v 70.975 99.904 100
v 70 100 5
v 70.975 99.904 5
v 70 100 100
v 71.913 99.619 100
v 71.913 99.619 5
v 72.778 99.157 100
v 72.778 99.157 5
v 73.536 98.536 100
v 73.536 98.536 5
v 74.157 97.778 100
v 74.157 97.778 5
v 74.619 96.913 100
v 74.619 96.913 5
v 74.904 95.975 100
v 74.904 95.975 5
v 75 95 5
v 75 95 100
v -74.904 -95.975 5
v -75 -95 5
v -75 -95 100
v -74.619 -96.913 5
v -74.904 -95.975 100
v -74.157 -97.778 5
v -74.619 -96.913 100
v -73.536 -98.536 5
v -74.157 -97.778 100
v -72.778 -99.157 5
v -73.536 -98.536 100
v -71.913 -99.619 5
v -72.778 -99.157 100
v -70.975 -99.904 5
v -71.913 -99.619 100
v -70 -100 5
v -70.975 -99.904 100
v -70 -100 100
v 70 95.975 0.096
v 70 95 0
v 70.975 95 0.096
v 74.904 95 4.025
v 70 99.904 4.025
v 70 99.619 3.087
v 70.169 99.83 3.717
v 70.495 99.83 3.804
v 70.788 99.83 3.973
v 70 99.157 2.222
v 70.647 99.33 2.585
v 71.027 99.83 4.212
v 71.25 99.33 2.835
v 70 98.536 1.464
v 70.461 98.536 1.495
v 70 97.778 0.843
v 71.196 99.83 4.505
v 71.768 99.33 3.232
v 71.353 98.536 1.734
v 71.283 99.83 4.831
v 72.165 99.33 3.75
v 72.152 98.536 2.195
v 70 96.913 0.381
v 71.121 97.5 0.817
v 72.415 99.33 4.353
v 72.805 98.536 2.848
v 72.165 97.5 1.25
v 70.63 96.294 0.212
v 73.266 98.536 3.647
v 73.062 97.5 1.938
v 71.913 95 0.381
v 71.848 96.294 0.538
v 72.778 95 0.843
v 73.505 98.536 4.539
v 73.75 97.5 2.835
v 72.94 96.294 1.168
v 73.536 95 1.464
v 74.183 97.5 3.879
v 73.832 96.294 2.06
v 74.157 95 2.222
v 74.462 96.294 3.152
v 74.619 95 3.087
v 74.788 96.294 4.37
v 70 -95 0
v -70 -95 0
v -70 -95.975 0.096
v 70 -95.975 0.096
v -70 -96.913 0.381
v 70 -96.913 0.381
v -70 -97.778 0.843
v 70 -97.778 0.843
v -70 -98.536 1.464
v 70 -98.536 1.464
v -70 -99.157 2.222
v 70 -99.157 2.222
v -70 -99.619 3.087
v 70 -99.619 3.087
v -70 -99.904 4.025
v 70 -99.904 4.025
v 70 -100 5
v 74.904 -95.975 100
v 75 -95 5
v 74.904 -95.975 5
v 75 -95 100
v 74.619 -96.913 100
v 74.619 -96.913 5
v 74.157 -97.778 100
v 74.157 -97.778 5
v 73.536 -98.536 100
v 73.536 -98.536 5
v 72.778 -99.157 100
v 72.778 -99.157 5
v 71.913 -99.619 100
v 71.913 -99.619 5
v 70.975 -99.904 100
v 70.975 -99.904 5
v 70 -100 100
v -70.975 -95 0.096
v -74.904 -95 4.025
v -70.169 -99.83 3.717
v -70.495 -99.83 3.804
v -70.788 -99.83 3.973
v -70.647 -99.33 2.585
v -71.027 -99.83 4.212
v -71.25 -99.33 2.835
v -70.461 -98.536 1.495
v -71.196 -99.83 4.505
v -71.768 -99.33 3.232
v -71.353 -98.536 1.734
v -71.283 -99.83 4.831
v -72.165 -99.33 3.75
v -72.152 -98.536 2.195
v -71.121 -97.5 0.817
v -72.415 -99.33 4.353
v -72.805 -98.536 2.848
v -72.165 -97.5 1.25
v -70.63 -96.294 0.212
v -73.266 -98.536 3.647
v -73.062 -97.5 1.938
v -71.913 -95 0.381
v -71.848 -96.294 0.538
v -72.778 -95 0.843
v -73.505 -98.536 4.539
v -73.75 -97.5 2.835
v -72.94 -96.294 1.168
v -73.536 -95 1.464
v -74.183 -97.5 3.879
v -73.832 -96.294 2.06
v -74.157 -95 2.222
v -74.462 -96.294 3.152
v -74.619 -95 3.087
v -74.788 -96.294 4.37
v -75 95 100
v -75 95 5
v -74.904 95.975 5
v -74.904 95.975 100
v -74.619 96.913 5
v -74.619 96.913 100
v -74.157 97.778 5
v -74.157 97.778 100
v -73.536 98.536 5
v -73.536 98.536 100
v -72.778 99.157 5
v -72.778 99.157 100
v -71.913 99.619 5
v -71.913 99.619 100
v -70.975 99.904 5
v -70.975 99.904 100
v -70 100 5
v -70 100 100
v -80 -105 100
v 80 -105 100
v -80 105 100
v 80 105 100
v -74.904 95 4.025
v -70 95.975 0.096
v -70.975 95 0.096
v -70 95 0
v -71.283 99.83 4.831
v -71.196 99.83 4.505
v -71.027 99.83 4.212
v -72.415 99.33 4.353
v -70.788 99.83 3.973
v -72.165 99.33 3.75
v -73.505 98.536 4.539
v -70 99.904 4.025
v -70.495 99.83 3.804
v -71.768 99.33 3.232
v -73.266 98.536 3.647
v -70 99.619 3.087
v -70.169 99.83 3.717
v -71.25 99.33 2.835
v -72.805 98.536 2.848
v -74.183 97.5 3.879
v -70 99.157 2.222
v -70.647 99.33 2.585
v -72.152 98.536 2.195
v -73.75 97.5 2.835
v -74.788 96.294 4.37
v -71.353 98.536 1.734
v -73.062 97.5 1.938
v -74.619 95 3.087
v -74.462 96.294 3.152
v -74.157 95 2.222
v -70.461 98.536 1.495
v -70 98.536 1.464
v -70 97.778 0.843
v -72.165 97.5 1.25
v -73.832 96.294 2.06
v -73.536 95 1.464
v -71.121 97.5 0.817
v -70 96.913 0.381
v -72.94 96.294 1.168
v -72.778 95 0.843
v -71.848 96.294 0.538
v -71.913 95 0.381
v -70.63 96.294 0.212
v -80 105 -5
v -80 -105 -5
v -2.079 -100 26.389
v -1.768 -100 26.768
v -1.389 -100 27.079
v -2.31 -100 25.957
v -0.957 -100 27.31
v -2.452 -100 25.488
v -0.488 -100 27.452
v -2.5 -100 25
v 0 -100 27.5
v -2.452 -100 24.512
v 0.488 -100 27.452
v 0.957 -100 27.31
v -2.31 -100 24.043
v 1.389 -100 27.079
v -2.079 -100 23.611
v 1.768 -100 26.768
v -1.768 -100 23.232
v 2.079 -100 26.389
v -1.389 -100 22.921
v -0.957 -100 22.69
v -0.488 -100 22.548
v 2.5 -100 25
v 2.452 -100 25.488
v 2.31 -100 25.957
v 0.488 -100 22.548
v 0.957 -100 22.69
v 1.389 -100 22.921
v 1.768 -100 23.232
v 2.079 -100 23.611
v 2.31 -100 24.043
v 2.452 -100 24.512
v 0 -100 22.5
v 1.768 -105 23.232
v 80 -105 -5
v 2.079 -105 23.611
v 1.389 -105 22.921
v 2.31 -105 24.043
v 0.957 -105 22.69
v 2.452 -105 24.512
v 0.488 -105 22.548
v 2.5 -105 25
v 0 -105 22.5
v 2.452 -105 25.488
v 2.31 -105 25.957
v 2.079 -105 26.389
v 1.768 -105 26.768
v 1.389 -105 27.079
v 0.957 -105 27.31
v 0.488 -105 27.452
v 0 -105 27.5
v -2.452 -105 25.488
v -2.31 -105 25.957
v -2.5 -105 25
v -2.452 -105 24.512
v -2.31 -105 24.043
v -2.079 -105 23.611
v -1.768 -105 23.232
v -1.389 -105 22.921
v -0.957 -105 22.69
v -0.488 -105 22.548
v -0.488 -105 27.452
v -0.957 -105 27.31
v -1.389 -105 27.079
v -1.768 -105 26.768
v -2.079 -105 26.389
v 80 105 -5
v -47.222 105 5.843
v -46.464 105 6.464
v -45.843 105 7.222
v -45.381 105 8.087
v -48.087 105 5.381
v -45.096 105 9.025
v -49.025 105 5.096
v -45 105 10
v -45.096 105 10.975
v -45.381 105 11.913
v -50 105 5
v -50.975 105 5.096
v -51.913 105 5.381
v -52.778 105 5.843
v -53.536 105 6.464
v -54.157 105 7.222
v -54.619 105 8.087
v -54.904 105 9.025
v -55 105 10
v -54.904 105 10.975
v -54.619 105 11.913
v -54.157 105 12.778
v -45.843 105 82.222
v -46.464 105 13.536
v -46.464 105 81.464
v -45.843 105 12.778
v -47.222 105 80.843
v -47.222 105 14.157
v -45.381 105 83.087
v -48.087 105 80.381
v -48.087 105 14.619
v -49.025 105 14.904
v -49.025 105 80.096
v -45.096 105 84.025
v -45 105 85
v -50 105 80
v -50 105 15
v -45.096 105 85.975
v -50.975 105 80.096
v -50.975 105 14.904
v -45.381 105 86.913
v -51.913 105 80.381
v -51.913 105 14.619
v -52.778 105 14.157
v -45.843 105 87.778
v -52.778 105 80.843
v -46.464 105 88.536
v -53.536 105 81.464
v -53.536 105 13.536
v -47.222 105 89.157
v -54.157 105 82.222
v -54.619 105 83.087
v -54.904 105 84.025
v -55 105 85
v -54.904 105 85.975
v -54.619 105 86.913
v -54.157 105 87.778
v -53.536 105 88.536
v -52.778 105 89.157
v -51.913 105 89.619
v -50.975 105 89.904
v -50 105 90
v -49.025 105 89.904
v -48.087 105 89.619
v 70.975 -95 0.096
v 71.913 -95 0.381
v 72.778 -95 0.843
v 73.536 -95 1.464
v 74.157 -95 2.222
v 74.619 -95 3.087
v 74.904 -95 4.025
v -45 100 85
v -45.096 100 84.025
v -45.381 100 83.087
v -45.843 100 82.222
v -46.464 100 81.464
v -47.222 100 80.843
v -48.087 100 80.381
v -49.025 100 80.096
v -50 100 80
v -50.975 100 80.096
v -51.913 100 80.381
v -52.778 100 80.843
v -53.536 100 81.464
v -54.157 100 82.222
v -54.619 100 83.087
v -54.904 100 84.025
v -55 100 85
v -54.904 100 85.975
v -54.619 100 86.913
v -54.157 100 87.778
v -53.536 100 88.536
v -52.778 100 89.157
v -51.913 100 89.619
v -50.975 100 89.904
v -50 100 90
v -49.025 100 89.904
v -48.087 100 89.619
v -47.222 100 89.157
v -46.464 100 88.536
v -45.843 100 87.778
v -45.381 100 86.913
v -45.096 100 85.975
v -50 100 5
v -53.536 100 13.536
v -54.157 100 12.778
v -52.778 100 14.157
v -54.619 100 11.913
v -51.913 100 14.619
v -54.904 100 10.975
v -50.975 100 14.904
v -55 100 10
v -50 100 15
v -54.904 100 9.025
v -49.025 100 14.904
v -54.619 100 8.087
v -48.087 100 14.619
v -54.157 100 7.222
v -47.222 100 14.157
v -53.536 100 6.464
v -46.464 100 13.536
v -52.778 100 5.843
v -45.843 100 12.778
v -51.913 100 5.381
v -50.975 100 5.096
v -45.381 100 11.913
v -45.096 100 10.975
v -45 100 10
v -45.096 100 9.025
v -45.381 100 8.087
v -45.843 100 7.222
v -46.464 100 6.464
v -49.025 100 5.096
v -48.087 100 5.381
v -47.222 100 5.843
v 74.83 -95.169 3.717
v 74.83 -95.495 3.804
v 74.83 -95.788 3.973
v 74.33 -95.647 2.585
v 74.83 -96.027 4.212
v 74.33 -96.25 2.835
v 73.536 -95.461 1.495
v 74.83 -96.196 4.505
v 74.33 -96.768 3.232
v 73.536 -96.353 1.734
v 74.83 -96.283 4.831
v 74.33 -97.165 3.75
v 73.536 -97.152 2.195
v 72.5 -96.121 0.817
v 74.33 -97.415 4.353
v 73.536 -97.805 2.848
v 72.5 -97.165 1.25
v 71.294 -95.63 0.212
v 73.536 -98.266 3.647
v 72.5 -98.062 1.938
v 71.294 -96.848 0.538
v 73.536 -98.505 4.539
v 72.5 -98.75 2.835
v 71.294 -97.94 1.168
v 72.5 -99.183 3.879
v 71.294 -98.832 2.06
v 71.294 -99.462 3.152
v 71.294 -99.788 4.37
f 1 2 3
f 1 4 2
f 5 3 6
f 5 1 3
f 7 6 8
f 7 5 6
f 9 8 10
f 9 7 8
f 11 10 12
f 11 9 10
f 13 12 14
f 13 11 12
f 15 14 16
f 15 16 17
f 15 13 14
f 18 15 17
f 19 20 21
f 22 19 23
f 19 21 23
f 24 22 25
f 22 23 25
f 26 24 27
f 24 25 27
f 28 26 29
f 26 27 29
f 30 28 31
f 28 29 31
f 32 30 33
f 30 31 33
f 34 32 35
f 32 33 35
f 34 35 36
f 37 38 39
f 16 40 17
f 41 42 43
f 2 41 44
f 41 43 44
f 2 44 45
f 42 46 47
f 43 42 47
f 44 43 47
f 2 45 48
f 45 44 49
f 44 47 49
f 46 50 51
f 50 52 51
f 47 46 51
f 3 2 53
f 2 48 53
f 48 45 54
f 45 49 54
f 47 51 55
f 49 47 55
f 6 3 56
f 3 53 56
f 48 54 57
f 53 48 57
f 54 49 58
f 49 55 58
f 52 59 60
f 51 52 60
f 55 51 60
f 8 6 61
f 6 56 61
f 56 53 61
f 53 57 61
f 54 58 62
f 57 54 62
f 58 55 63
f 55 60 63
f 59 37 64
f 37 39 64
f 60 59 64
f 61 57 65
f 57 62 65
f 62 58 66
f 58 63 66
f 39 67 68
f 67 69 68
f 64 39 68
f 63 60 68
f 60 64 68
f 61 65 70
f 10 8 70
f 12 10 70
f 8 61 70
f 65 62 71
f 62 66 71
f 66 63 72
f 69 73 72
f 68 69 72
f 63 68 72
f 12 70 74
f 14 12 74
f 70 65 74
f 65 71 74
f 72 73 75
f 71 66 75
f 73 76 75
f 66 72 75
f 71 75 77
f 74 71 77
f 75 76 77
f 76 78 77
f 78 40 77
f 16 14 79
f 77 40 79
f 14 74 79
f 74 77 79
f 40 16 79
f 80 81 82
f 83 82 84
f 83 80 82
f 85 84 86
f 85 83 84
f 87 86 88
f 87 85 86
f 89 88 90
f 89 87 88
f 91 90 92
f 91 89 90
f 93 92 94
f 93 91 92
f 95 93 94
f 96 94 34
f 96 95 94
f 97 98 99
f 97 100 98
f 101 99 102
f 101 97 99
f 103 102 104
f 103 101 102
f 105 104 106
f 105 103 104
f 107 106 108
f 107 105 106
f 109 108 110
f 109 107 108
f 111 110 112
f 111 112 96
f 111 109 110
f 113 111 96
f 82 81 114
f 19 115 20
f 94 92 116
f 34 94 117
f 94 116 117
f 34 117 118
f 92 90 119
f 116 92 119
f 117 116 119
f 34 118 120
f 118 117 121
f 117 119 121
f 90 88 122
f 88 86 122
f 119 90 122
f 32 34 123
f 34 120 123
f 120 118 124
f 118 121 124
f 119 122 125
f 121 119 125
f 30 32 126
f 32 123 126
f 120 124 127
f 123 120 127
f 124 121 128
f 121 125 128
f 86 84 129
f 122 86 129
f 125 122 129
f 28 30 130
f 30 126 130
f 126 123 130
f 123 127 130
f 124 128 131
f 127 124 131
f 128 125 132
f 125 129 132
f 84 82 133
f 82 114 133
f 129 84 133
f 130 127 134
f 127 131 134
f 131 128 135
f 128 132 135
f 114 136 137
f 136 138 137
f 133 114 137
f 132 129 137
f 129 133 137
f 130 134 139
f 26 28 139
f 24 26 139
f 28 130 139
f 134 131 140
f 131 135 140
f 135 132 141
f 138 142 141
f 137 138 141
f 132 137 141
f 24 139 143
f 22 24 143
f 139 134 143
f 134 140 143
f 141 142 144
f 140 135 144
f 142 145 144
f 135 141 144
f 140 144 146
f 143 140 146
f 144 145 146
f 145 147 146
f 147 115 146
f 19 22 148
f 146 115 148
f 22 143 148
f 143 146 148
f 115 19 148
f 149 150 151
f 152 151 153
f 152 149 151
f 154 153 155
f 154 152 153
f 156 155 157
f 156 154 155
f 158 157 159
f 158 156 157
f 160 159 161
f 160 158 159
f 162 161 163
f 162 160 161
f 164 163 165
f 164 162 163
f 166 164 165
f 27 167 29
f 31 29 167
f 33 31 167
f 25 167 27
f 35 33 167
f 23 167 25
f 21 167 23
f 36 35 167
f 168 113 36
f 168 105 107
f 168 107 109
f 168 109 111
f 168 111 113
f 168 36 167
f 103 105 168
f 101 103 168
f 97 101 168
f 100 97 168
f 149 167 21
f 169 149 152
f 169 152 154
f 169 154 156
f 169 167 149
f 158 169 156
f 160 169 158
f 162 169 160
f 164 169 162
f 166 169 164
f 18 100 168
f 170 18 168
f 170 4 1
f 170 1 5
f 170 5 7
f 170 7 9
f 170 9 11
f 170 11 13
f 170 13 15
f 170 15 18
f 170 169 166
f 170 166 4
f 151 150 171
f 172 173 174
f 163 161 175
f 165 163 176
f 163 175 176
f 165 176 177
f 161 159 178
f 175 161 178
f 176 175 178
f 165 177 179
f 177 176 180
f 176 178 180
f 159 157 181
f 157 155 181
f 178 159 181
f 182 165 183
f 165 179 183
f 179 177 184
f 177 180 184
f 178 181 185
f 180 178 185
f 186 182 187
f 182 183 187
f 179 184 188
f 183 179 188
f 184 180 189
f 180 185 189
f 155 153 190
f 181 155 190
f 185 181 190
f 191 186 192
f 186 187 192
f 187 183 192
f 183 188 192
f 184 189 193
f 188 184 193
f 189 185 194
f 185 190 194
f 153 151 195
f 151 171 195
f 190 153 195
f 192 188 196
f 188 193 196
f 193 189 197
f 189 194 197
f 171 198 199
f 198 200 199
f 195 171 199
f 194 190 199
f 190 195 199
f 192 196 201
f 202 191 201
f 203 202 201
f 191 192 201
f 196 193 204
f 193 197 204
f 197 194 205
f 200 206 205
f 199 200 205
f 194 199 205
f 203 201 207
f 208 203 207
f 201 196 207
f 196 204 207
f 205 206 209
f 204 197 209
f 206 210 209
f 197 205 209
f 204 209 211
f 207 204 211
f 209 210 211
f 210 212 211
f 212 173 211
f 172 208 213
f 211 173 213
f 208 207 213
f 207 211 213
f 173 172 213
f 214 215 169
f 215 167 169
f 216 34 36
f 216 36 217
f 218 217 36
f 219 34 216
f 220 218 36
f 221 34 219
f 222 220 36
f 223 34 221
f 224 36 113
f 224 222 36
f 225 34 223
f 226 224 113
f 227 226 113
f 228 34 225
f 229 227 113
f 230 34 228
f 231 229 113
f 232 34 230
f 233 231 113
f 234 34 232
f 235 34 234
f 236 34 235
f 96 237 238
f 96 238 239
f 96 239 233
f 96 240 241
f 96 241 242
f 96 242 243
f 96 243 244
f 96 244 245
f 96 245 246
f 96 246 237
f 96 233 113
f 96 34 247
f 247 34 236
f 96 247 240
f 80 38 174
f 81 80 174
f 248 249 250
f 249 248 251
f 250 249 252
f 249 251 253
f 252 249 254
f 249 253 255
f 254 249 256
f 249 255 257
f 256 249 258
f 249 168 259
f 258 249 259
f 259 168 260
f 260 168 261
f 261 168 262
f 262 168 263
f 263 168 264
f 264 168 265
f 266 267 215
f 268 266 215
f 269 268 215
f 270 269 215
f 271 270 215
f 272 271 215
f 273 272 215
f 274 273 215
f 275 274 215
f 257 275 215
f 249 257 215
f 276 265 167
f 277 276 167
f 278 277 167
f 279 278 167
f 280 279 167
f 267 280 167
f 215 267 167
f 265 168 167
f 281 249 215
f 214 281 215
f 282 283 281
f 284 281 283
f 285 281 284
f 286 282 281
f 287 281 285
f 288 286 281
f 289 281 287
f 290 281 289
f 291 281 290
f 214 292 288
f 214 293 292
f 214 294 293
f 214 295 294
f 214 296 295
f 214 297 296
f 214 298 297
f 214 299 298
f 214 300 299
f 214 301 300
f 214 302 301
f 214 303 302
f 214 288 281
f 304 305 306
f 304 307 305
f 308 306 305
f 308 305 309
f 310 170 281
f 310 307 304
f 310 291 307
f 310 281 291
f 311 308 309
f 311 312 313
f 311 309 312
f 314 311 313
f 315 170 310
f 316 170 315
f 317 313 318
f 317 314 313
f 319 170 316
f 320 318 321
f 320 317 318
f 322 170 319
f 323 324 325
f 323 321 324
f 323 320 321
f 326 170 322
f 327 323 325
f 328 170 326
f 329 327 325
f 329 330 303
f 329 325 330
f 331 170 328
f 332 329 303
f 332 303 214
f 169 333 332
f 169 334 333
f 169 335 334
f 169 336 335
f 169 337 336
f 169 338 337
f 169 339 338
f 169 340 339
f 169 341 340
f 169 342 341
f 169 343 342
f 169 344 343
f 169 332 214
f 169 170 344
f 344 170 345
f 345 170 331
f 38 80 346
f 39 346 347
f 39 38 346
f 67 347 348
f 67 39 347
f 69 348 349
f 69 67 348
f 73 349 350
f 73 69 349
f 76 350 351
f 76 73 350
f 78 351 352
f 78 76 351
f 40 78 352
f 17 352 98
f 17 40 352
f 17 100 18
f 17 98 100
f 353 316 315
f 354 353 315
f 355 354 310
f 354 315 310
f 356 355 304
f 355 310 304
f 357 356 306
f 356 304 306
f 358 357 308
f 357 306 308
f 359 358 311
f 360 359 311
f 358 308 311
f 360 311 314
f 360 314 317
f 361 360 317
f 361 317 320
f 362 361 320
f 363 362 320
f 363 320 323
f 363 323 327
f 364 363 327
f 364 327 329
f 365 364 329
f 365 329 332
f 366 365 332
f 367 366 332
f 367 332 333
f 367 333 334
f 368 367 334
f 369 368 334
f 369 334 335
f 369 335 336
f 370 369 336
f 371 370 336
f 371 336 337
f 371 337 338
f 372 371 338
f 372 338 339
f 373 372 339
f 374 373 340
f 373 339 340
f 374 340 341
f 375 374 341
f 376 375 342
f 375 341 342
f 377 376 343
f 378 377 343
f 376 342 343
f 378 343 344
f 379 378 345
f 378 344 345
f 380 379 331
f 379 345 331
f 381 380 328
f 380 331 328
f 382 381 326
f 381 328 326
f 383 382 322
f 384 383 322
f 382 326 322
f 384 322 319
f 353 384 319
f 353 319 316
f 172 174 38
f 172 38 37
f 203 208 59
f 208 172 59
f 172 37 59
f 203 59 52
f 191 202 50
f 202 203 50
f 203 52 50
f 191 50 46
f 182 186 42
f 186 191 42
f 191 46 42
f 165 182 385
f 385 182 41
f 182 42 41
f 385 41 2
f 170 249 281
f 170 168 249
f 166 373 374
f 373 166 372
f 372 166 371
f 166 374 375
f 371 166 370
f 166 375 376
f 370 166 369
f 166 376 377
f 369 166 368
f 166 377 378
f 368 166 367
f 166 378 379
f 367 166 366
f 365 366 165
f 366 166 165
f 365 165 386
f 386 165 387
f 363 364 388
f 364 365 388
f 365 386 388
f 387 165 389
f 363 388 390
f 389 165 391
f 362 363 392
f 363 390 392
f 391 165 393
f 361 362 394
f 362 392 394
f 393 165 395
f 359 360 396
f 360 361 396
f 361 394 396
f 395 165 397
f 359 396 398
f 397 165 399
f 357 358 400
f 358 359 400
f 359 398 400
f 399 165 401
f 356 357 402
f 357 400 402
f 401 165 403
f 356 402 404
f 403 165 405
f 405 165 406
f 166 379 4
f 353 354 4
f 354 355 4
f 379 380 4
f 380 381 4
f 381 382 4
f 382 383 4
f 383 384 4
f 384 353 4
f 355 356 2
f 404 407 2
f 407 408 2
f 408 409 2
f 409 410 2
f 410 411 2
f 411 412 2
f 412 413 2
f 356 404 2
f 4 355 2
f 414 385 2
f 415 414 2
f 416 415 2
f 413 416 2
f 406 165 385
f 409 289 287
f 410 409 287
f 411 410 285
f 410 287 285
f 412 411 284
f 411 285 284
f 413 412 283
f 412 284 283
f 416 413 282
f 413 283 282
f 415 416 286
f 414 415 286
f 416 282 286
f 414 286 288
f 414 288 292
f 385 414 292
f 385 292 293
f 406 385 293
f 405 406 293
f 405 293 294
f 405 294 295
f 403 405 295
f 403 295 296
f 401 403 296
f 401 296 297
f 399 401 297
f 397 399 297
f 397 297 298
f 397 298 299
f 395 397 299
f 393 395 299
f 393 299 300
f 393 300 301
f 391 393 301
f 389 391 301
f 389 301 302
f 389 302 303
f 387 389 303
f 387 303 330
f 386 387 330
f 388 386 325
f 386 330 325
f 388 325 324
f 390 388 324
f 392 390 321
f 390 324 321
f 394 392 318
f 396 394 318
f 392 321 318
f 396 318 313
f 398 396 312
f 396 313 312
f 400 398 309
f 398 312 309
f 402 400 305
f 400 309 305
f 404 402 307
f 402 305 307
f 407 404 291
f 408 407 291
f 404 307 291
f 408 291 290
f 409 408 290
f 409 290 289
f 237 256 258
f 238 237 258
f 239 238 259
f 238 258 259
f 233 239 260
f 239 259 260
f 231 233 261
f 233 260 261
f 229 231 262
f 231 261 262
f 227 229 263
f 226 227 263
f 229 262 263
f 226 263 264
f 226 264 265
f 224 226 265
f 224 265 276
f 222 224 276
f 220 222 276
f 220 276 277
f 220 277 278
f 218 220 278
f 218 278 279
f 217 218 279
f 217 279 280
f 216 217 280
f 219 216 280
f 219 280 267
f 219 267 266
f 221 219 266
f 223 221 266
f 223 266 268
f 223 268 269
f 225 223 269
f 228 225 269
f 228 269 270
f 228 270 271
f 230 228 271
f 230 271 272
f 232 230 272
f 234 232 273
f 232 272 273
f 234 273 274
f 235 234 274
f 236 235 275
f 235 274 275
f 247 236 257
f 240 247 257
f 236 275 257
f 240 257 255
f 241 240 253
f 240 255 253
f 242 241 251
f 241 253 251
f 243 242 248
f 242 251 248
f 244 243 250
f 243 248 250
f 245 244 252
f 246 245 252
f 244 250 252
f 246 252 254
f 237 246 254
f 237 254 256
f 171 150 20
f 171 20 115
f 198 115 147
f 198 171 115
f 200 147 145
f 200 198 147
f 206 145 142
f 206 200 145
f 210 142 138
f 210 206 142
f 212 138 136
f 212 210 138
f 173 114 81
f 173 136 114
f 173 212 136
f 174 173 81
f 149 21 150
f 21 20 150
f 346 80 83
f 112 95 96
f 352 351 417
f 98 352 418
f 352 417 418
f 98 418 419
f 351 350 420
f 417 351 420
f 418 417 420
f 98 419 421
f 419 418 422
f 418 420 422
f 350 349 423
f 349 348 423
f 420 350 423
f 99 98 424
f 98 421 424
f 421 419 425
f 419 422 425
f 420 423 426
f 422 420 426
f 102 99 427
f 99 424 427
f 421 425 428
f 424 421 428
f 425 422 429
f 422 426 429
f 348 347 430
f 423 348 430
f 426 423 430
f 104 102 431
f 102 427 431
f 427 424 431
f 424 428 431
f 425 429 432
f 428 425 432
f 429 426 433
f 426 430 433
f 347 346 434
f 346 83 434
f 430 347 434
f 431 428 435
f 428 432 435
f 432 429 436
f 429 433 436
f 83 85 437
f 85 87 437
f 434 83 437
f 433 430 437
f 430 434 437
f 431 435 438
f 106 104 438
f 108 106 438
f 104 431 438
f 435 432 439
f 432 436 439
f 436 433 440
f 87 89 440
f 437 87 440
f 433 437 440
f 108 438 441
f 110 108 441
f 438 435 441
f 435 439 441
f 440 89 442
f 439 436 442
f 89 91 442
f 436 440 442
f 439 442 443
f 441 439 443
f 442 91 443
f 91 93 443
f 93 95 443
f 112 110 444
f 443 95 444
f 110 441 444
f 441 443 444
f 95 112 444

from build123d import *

# Parameters (mm, degrees)
SKETCH1_W           = 160
SKETCH1_H           = 210
SKETCH1_W_2         = 150
SKETCH1_H_2         = 200
BOSS_EXTRUDE1_DEPTH = 100
SKETCH3_W           = 160
SKETCH3_H           = 210
BOSS_EXTRUDE2_DEPTH = 5
FILLET1_R           = 5
SKETCH4_R           = 5
CUT_EXTRUDE1_DEPTH  = 48
SKETCH5_R           = 2.5
CUT_EXTRUDE2_DEPTH  = 40


with BuildPart() as part:
    # Sketch1 → Boss-Extrude1 (new body)
    with BuildSketch(Plane.XY):
        Rectangle(SKETCH1_W, SKETCH1_H)
        Rectangle(SKETCH1_W_2, SKETCH1_H_2, mode=Mode.SUBTRACT)
    extrude(amount=BOSS_EXTRUDE1_DEPTH)

    # Sketch3 → Boss-Extrude2 (add)
    with BuildSketch(Plane(origin=(0, 0, 0), x_dir=(-1, 0, 0), z_dir=(0, 0, -1))):
        Rectangle(SKETCH3_W, SKETCH3_H)
    extrude(amount=BOSS_EXTRUDE2_DEPTH)

    # Fillet1
    fillet1_edges = [part.edges().sort_by_distance(p)[0] for p in [
        (-75, 0, 0),
        (-75, 100, 50),
        (0, -100, 0),
        (-75, -100, 50),
        (75, 0, 0),
        (75, -100, 50),
        (0, 100, 0),
        (75, 100, 50),
    ]]
    fillet(fillet1_edges, radius=FILLET1_R)

    # Sketch4 → Cut-Extrude1 (cut)
    with BuildSketch(Plane(origin=(0, 105, 0), x_dir=(1, 0, 0), z_dir=(0, 1, 0))):
        with Locations((-50, -10)):
            Circle(SKETCH4_R)
        with Locations((-50, -85)):
            Circle(SKETCH4_R)
    extrude(amount=-CUT_EXTRUDE1_DEPTH, mode=Mode.SUBTRACT)

    # Sketch5 → Cut-Extrude2 (cut)
    with BuildSketch(Plane.XZ.offset(105)):
        with Locations((0, 25)):
            Circle(SKETCH5_R)
    extrude(amount=-CUT_EXTRUDE2_DEPTH, mode=Mode.SUBTRACT)


solid = part.part
